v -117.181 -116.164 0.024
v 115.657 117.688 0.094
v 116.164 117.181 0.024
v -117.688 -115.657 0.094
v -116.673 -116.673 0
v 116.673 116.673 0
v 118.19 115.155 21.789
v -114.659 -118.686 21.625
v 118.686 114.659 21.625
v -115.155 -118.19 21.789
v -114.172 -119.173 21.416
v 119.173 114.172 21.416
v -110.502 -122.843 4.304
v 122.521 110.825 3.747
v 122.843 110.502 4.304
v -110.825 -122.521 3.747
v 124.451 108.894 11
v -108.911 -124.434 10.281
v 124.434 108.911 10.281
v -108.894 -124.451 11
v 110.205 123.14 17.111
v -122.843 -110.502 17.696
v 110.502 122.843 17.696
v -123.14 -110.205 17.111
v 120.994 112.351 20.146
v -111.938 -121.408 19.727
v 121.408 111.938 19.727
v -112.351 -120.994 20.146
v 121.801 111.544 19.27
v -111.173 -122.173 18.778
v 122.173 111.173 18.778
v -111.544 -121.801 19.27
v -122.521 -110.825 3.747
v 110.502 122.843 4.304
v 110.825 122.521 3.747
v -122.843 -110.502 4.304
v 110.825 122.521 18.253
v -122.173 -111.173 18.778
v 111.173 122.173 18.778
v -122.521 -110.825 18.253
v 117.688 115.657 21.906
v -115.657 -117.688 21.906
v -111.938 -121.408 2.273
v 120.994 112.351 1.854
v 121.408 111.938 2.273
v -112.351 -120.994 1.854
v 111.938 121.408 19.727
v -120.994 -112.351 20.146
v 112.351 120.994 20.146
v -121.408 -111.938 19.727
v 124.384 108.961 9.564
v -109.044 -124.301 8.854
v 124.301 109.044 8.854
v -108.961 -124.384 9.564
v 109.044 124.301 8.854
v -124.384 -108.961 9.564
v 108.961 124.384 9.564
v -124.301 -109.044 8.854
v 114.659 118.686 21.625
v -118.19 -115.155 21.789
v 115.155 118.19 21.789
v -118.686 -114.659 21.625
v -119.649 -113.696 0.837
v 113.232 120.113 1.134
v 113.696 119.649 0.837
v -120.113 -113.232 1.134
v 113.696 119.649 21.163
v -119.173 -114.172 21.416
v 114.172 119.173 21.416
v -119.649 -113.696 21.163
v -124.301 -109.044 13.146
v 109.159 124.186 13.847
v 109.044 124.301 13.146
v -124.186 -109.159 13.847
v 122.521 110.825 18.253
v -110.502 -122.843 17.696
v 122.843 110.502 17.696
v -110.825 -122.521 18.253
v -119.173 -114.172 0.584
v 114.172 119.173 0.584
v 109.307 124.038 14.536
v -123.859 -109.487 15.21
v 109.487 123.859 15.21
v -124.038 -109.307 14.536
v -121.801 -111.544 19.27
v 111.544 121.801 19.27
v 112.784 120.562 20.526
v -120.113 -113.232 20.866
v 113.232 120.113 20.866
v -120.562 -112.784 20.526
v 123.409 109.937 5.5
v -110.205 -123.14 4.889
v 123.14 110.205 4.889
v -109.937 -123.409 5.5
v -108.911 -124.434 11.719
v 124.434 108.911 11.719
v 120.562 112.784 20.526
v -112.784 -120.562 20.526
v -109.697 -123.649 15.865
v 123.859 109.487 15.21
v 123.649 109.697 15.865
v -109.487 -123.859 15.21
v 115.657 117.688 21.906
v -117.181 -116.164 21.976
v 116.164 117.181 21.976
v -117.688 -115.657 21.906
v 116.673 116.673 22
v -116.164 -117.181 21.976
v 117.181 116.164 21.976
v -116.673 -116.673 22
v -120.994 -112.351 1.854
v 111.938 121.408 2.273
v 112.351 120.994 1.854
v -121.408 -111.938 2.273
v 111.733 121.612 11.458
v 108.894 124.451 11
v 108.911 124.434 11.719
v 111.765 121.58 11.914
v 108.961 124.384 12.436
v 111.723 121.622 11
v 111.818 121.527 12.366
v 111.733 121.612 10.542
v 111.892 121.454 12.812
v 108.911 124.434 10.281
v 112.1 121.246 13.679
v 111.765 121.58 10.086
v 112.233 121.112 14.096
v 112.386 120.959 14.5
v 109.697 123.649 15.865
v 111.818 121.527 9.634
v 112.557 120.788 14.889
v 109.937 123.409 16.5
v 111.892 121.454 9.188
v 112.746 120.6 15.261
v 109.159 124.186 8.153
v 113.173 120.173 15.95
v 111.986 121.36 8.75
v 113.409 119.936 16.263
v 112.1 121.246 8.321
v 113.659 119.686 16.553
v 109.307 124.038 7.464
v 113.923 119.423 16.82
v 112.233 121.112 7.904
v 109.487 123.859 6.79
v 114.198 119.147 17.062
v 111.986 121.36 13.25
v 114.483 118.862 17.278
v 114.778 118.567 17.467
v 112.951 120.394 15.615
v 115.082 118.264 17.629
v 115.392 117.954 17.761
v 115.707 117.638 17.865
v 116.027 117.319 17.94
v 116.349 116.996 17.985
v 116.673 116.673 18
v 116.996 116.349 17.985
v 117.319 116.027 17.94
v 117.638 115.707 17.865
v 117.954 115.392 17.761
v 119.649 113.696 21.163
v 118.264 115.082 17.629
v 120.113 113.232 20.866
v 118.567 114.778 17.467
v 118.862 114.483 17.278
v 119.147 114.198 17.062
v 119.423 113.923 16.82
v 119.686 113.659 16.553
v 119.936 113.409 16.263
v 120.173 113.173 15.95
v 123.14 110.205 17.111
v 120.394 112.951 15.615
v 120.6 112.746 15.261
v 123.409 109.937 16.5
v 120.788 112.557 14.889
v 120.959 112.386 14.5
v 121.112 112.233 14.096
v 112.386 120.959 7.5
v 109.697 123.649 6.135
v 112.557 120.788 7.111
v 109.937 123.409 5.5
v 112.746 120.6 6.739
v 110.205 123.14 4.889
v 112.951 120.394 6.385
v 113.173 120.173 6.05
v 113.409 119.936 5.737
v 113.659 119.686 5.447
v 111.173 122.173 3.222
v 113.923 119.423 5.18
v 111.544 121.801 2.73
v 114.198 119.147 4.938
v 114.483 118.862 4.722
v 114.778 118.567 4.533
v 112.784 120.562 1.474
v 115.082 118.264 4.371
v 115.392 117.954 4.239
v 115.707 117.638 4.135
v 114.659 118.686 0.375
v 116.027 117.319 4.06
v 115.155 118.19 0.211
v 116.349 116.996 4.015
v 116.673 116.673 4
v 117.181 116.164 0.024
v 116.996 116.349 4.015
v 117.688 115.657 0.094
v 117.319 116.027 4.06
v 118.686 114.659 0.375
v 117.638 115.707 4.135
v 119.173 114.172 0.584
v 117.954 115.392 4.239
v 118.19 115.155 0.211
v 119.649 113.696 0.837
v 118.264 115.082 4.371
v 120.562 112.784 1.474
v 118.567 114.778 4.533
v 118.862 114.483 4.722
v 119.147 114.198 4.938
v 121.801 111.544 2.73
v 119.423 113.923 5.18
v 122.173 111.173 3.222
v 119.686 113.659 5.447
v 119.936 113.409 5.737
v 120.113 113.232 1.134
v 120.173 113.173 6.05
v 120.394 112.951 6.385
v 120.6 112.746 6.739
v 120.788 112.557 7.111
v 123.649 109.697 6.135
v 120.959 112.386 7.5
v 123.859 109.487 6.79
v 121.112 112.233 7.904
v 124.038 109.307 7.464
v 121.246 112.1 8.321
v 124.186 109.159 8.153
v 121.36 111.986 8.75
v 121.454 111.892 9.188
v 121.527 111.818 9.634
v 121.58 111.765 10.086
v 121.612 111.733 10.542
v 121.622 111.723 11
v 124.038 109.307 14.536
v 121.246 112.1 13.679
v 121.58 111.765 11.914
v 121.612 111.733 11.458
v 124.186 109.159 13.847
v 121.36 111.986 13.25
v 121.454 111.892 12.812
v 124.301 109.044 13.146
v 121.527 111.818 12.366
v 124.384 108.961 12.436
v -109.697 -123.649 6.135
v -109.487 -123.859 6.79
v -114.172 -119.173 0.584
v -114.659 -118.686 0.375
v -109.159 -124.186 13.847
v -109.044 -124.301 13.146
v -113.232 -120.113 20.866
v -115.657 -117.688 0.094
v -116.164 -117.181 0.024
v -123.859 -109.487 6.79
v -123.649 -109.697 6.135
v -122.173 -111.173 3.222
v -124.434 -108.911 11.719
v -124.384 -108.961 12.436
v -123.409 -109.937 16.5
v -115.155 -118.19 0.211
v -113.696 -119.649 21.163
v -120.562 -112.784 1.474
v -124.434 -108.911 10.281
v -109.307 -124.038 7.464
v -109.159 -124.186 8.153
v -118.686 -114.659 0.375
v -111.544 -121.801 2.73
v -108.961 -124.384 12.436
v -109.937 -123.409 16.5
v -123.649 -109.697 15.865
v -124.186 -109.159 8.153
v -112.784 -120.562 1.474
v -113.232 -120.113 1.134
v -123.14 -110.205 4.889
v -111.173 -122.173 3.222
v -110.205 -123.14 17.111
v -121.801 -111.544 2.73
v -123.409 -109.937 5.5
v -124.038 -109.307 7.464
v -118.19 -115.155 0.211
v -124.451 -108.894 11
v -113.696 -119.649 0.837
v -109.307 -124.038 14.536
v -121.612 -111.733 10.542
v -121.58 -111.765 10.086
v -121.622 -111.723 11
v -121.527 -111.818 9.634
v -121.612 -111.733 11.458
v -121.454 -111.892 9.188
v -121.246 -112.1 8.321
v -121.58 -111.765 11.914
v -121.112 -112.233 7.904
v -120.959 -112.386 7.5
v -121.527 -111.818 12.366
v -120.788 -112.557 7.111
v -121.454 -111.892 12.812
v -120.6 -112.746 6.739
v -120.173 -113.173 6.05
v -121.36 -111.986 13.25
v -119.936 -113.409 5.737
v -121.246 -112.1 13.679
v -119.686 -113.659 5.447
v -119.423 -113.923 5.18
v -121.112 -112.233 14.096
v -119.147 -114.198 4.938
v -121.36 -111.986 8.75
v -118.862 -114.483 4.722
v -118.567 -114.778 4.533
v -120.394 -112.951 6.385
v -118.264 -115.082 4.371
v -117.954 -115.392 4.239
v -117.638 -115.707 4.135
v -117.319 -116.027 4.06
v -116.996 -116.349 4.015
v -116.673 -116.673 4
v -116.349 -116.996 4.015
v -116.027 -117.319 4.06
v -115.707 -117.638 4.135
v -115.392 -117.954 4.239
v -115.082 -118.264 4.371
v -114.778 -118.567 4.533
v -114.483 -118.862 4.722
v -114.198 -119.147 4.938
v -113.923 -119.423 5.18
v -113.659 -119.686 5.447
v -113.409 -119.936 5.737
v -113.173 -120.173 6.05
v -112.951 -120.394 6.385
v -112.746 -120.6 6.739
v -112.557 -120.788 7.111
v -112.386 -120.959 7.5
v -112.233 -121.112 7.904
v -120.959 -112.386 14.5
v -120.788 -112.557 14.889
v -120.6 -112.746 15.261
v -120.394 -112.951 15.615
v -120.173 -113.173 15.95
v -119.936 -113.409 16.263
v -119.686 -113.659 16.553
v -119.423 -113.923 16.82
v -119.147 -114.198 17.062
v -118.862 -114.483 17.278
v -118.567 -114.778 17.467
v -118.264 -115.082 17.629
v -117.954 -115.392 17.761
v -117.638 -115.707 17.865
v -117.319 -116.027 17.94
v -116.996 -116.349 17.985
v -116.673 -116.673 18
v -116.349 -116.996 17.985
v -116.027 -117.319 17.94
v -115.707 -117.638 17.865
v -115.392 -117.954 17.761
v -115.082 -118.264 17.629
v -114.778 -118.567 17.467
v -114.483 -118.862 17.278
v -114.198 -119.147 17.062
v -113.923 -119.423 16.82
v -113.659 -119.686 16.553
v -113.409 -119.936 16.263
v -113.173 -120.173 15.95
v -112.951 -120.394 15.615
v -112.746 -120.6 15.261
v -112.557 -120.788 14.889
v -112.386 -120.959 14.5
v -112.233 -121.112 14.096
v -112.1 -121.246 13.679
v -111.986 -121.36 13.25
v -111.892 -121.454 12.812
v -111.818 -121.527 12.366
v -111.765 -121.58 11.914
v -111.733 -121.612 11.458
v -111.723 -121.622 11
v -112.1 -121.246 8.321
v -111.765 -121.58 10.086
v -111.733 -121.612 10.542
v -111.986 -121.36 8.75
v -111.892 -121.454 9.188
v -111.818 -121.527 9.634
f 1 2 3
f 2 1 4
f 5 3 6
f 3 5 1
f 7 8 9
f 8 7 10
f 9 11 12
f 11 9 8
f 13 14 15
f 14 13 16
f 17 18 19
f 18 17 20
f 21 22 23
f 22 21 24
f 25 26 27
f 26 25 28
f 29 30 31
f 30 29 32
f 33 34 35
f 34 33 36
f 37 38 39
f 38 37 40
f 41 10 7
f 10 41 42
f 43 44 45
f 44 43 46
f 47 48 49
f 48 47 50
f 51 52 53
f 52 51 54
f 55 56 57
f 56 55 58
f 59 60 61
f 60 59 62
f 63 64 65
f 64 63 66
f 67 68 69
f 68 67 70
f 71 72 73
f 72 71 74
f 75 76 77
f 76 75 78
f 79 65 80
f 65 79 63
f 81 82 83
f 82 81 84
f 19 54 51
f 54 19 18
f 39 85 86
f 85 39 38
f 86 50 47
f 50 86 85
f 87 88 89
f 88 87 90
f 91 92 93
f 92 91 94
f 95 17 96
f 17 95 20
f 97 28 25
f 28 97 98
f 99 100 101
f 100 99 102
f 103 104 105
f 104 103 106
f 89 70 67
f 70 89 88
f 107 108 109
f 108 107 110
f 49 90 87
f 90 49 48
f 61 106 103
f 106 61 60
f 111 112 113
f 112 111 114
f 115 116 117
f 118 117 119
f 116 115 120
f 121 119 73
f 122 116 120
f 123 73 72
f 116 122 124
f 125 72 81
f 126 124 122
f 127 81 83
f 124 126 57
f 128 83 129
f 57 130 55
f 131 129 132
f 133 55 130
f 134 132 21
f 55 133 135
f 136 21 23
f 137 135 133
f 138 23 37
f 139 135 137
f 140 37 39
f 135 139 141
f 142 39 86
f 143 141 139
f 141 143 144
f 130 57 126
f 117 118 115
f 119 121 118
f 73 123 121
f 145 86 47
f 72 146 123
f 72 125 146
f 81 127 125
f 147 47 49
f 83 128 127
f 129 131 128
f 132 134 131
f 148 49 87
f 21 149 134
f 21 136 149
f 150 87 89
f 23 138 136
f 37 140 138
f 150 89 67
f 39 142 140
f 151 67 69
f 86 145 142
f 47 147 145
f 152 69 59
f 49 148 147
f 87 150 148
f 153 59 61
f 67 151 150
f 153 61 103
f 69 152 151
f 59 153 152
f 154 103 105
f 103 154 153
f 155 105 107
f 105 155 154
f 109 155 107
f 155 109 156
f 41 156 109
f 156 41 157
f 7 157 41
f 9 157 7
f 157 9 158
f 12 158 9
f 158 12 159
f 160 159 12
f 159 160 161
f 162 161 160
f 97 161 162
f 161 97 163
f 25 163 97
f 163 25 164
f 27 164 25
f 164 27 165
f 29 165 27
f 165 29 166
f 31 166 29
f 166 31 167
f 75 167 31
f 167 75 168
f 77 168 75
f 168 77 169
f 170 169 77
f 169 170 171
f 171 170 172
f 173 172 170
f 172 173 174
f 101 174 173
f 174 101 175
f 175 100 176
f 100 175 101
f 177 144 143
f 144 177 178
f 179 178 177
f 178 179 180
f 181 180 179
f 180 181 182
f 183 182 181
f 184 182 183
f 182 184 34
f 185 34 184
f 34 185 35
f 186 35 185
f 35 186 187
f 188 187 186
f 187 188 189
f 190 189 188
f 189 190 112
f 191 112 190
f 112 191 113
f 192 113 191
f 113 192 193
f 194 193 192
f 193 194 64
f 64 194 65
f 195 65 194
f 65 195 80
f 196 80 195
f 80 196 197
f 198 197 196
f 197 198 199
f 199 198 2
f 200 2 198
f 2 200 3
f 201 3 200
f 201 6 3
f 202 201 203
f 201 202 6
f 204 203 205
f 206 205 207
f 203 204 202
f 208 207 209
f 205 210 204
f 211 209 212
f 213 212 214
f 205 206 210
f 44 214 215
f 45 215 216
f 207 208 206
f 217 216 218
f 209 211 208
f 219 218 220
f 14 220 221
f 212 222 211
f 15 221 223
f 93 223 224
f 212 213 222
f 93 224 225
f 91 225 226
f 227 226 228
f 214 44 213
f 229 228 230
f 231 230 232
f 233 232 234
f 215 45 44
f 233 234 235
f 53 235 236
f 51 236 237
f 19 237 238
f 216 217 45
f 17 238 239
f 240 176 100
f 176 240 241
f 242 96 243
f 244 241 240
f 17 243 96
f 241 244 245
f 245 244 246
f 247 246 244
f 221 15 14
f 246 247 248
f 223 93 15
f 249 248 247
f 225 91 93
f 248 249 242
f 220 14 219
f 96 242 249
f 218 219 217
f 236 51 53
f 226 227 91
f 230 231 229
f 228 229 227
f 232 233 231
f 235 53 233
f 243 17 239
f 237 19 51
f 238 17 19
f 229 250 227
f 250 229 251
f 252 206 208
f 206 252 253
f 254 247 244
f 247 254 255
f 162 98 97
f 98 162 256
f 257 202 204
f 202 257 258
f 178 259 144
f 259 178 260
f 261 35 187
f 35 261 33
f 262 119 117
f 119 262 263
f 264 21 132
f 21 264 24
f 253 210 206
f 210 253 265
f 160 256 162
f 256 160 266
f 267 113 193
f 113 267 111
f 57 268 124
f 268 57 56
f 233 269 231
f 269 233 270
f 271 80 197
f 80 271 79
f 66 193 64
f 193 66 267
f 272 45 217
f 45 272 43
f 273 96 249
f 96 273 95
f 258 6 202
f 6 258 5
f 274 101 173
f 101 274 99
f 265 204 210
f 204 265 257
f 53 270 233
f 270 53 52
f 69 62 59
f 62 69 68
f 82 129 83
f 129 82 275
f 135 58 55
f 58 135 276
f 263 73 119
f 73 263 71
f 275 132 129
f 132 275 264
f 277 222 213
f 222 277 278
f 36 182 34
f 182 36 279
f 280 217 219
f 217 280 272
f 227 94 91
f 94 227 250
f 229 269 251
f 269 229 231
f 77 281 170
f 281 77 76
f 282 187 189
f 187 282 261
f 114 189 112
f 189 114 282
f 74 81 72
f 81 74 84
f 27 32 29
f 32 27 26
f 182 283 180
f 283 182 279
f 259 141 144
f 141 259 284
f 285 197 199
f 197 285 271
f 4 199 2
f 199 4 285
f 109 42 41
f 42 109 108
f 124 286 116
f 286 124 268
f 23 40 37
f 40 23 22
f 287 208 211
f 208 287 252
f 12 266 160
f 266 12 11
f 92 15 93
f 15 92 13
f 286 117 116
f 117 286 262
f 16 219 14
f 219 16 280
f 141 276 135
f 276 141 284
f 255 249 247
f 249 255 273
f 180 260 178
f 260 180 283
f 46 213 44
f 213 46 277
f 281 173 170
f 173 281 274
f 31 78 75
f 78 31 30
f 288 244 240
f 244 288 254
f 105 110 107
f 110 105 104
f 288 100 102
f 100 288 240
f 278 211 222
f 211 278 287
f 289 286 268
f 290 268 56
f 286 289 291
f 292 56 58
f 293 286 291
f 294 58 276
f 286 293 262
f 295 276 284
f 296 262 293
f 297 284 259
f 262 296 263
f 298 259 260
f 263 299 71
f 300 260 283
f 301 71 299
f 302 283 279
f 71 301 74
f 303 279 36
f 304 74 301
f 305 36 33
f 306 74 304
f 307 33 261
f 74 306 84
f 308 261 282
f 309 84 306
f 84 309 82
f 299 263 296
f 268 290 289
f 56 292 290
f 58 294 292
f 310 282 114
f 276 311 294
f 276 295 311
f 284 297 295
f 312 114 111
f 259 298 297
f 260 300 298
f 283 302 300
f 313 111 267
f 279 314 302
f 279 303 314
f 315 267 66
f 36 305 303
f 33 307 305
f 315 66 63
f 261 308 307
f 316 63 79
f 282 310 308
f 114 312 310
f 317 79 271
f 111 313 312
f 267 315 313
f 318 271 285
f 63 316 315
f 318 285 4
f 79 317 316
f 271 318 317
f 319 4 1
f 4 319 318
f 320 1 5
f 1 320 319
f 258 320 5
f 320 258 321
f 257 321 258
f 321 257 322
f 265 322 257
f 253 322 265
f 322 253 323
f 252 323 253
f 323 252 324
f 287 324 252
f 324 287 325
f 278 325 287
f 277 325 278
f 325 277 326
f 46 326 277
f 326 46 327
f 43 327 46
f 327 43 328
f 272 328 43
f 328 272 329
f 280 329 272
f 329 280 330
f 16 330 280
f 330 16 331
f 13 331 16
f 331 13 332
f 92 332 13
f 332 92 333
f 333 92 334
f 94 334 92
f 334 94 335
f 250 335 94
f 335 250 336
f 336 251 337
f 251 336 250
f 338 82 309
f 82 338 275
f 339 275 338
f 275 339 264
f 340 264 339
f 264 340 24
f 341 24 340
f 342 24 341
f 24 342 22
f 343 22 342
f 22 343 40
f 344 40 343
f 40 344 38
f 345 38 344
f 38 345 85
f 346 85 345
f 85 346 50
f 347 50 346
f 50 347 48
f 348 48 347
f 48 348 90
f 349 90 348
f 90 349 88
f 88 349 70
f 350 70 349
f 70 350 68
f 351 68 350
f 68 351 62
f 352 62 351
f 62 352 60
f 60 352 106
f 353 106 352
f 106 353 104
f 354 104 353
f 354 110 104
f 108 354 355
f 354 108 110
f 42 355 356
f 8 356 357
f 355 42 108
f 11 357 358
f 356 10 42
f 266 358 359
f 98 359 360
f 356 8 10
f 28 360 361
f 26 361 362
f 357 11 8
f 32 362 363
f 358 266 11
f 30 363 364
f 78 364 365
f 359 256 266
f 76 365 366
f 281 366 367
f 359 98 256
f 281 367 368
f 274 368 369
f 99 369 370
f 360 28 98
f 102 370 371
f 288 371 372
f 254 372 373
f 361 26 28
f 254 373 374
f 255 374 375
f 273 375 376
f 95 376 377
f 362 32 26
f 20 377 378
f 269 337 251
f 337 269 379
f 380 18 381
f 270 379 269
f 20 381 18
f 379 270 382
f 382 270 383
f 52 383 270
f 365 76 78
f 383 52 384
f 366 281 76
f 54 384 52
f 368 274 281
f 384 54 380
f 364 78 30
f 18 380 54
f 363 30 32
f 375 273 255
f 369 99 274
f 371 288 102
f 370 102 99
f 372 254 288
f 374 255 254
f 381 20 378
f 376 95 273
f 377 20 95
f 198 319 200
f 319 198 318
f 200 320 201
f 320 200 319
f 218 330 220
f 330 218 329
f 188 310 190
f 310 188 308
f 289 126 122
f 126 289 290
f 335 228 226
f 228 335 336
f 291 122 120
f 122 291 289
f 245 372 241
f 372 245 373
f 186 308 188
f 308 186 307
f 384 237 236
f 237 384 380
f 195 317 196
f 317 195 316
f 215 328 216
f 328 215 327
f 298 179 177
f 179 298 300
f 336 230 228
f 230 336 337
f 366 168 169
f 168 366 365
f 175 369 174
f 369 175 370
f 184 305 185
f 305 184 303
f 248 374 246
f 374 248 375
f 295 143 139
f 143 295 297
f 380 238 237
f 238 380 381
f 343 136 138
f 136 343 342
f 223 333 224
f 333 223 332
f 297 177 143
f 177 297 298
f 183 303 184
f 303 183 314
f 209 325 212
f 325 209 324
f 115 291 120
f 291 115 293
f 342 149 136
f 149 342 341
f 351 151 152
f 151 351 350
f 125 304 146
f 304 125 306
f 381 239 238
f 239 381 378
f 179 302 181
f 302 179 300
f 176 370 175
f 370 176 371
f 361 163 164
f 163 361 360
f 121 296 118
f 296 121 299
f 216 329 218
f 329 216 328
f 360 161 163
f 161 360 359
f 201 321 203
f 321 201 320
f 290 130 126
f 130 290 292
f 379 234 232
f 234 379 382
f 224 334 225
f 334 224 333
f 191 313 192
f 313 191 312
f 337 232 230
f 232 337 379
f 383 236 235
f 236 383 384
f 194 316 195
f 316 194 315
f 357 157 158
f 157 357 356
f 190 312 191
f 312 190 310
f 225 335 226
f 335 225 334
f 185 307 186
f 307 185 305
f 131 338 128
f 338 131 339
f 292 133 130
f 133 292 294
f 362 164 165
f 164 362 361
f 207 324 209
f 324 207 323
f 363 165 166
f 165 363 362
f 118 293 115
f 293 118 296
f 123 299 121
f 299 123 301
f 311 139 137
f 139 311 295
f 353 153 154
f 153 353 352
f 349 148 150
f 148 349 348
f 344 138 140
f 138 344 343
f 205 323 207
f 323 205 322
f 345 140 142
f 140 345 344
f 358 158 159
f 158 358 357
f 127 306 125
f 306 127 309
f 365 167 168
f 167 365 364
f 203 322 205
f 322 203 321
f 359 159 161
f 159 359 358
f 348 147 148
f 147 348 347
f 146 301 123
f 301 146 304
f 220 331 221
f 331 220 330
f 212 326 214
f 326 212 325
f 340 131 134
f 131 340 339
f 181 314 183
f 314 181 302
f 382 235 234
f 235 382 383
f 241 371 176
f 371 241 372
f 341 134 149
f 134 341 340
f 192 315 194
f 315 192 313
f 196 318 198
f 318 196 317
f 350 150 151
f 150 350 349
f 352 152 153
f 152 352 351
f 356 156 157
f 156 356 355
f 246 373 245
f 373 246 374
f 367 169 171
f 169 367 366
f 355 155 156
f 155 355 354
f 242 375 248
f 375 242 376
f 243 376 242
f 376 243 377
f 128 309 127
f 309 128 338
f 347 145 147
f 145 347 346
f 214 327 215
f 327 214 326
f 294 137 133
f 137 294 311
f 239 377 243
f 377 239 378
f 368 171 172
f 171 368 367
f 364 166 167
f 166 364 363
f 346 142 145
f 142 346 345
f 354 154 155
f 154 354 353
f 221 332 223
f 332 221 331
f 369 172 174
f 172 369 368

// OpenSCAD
// One-piece open-ended wardrobe rod. Dimensions are user supplied.

// Adjustable Parameters
// Holder spacing and engagement
clear_span_mm = 300;
left_insertion_depth_mm = 15;
right_insertion_depth_mm = 15;

// Circular cross-section
outside_diameter_mm = 22;
wall_thickness_mm = 4;

// View selection
render_mode = "printable_layout"; // [printable_layout, assembly]

// Derived Values
rod_length_mm = clear_span_mm + left_insertion_depth_mm + right_insertion_depth_mm;
bore_diameter_mm = outside_diameter_mm - 2 * wall_thickness_mm;
outer_radius_mm = outside_diameter_mm / 2;
bore_overrun_mm = 0.1;
$fn = 96;

assert(clear_span_mm > 0, "Clear span must be positive.");
assert(left_insertion_depth_mm >= 0 && right_insertion_depth_mm >= 0,
       "Insertion depths must be nonnegative.");
assert(outside_diameter_mm > 0, "Outside diameter must be positive.");
assert(wall_thickness_mm > 0, "Wall thickness must be positive.");
assert(bore_diameter_mm > 0, "Wall thickness must leave an open bore.");
assert(render_mode == "printable_layout" || render_mode == "assembly",
       "Unsupported render_mode.");

module wardrobe_rod() {
    difference() {
        cylinder(h = rod_length_mm, d = outside_diameter_mm, center = true);
        cylinder(h = rod_length_mm + 2 * bore_overrun_mm,
                 d = bore_diameter_mm, center = true);
    }
}

module horizontal_rod() {
    translate([0, 0, outer_radius_mm])
        rotate([0, 90, 0]) wardrobe_rod();
}

module printable_layout() {
    rotate([0, 0, 45]) horizontal_rod();
}

module assembly() {
    horizontal_rod();
}

if (render_mode == "printable_layout") printable_layout();
else assembly();
